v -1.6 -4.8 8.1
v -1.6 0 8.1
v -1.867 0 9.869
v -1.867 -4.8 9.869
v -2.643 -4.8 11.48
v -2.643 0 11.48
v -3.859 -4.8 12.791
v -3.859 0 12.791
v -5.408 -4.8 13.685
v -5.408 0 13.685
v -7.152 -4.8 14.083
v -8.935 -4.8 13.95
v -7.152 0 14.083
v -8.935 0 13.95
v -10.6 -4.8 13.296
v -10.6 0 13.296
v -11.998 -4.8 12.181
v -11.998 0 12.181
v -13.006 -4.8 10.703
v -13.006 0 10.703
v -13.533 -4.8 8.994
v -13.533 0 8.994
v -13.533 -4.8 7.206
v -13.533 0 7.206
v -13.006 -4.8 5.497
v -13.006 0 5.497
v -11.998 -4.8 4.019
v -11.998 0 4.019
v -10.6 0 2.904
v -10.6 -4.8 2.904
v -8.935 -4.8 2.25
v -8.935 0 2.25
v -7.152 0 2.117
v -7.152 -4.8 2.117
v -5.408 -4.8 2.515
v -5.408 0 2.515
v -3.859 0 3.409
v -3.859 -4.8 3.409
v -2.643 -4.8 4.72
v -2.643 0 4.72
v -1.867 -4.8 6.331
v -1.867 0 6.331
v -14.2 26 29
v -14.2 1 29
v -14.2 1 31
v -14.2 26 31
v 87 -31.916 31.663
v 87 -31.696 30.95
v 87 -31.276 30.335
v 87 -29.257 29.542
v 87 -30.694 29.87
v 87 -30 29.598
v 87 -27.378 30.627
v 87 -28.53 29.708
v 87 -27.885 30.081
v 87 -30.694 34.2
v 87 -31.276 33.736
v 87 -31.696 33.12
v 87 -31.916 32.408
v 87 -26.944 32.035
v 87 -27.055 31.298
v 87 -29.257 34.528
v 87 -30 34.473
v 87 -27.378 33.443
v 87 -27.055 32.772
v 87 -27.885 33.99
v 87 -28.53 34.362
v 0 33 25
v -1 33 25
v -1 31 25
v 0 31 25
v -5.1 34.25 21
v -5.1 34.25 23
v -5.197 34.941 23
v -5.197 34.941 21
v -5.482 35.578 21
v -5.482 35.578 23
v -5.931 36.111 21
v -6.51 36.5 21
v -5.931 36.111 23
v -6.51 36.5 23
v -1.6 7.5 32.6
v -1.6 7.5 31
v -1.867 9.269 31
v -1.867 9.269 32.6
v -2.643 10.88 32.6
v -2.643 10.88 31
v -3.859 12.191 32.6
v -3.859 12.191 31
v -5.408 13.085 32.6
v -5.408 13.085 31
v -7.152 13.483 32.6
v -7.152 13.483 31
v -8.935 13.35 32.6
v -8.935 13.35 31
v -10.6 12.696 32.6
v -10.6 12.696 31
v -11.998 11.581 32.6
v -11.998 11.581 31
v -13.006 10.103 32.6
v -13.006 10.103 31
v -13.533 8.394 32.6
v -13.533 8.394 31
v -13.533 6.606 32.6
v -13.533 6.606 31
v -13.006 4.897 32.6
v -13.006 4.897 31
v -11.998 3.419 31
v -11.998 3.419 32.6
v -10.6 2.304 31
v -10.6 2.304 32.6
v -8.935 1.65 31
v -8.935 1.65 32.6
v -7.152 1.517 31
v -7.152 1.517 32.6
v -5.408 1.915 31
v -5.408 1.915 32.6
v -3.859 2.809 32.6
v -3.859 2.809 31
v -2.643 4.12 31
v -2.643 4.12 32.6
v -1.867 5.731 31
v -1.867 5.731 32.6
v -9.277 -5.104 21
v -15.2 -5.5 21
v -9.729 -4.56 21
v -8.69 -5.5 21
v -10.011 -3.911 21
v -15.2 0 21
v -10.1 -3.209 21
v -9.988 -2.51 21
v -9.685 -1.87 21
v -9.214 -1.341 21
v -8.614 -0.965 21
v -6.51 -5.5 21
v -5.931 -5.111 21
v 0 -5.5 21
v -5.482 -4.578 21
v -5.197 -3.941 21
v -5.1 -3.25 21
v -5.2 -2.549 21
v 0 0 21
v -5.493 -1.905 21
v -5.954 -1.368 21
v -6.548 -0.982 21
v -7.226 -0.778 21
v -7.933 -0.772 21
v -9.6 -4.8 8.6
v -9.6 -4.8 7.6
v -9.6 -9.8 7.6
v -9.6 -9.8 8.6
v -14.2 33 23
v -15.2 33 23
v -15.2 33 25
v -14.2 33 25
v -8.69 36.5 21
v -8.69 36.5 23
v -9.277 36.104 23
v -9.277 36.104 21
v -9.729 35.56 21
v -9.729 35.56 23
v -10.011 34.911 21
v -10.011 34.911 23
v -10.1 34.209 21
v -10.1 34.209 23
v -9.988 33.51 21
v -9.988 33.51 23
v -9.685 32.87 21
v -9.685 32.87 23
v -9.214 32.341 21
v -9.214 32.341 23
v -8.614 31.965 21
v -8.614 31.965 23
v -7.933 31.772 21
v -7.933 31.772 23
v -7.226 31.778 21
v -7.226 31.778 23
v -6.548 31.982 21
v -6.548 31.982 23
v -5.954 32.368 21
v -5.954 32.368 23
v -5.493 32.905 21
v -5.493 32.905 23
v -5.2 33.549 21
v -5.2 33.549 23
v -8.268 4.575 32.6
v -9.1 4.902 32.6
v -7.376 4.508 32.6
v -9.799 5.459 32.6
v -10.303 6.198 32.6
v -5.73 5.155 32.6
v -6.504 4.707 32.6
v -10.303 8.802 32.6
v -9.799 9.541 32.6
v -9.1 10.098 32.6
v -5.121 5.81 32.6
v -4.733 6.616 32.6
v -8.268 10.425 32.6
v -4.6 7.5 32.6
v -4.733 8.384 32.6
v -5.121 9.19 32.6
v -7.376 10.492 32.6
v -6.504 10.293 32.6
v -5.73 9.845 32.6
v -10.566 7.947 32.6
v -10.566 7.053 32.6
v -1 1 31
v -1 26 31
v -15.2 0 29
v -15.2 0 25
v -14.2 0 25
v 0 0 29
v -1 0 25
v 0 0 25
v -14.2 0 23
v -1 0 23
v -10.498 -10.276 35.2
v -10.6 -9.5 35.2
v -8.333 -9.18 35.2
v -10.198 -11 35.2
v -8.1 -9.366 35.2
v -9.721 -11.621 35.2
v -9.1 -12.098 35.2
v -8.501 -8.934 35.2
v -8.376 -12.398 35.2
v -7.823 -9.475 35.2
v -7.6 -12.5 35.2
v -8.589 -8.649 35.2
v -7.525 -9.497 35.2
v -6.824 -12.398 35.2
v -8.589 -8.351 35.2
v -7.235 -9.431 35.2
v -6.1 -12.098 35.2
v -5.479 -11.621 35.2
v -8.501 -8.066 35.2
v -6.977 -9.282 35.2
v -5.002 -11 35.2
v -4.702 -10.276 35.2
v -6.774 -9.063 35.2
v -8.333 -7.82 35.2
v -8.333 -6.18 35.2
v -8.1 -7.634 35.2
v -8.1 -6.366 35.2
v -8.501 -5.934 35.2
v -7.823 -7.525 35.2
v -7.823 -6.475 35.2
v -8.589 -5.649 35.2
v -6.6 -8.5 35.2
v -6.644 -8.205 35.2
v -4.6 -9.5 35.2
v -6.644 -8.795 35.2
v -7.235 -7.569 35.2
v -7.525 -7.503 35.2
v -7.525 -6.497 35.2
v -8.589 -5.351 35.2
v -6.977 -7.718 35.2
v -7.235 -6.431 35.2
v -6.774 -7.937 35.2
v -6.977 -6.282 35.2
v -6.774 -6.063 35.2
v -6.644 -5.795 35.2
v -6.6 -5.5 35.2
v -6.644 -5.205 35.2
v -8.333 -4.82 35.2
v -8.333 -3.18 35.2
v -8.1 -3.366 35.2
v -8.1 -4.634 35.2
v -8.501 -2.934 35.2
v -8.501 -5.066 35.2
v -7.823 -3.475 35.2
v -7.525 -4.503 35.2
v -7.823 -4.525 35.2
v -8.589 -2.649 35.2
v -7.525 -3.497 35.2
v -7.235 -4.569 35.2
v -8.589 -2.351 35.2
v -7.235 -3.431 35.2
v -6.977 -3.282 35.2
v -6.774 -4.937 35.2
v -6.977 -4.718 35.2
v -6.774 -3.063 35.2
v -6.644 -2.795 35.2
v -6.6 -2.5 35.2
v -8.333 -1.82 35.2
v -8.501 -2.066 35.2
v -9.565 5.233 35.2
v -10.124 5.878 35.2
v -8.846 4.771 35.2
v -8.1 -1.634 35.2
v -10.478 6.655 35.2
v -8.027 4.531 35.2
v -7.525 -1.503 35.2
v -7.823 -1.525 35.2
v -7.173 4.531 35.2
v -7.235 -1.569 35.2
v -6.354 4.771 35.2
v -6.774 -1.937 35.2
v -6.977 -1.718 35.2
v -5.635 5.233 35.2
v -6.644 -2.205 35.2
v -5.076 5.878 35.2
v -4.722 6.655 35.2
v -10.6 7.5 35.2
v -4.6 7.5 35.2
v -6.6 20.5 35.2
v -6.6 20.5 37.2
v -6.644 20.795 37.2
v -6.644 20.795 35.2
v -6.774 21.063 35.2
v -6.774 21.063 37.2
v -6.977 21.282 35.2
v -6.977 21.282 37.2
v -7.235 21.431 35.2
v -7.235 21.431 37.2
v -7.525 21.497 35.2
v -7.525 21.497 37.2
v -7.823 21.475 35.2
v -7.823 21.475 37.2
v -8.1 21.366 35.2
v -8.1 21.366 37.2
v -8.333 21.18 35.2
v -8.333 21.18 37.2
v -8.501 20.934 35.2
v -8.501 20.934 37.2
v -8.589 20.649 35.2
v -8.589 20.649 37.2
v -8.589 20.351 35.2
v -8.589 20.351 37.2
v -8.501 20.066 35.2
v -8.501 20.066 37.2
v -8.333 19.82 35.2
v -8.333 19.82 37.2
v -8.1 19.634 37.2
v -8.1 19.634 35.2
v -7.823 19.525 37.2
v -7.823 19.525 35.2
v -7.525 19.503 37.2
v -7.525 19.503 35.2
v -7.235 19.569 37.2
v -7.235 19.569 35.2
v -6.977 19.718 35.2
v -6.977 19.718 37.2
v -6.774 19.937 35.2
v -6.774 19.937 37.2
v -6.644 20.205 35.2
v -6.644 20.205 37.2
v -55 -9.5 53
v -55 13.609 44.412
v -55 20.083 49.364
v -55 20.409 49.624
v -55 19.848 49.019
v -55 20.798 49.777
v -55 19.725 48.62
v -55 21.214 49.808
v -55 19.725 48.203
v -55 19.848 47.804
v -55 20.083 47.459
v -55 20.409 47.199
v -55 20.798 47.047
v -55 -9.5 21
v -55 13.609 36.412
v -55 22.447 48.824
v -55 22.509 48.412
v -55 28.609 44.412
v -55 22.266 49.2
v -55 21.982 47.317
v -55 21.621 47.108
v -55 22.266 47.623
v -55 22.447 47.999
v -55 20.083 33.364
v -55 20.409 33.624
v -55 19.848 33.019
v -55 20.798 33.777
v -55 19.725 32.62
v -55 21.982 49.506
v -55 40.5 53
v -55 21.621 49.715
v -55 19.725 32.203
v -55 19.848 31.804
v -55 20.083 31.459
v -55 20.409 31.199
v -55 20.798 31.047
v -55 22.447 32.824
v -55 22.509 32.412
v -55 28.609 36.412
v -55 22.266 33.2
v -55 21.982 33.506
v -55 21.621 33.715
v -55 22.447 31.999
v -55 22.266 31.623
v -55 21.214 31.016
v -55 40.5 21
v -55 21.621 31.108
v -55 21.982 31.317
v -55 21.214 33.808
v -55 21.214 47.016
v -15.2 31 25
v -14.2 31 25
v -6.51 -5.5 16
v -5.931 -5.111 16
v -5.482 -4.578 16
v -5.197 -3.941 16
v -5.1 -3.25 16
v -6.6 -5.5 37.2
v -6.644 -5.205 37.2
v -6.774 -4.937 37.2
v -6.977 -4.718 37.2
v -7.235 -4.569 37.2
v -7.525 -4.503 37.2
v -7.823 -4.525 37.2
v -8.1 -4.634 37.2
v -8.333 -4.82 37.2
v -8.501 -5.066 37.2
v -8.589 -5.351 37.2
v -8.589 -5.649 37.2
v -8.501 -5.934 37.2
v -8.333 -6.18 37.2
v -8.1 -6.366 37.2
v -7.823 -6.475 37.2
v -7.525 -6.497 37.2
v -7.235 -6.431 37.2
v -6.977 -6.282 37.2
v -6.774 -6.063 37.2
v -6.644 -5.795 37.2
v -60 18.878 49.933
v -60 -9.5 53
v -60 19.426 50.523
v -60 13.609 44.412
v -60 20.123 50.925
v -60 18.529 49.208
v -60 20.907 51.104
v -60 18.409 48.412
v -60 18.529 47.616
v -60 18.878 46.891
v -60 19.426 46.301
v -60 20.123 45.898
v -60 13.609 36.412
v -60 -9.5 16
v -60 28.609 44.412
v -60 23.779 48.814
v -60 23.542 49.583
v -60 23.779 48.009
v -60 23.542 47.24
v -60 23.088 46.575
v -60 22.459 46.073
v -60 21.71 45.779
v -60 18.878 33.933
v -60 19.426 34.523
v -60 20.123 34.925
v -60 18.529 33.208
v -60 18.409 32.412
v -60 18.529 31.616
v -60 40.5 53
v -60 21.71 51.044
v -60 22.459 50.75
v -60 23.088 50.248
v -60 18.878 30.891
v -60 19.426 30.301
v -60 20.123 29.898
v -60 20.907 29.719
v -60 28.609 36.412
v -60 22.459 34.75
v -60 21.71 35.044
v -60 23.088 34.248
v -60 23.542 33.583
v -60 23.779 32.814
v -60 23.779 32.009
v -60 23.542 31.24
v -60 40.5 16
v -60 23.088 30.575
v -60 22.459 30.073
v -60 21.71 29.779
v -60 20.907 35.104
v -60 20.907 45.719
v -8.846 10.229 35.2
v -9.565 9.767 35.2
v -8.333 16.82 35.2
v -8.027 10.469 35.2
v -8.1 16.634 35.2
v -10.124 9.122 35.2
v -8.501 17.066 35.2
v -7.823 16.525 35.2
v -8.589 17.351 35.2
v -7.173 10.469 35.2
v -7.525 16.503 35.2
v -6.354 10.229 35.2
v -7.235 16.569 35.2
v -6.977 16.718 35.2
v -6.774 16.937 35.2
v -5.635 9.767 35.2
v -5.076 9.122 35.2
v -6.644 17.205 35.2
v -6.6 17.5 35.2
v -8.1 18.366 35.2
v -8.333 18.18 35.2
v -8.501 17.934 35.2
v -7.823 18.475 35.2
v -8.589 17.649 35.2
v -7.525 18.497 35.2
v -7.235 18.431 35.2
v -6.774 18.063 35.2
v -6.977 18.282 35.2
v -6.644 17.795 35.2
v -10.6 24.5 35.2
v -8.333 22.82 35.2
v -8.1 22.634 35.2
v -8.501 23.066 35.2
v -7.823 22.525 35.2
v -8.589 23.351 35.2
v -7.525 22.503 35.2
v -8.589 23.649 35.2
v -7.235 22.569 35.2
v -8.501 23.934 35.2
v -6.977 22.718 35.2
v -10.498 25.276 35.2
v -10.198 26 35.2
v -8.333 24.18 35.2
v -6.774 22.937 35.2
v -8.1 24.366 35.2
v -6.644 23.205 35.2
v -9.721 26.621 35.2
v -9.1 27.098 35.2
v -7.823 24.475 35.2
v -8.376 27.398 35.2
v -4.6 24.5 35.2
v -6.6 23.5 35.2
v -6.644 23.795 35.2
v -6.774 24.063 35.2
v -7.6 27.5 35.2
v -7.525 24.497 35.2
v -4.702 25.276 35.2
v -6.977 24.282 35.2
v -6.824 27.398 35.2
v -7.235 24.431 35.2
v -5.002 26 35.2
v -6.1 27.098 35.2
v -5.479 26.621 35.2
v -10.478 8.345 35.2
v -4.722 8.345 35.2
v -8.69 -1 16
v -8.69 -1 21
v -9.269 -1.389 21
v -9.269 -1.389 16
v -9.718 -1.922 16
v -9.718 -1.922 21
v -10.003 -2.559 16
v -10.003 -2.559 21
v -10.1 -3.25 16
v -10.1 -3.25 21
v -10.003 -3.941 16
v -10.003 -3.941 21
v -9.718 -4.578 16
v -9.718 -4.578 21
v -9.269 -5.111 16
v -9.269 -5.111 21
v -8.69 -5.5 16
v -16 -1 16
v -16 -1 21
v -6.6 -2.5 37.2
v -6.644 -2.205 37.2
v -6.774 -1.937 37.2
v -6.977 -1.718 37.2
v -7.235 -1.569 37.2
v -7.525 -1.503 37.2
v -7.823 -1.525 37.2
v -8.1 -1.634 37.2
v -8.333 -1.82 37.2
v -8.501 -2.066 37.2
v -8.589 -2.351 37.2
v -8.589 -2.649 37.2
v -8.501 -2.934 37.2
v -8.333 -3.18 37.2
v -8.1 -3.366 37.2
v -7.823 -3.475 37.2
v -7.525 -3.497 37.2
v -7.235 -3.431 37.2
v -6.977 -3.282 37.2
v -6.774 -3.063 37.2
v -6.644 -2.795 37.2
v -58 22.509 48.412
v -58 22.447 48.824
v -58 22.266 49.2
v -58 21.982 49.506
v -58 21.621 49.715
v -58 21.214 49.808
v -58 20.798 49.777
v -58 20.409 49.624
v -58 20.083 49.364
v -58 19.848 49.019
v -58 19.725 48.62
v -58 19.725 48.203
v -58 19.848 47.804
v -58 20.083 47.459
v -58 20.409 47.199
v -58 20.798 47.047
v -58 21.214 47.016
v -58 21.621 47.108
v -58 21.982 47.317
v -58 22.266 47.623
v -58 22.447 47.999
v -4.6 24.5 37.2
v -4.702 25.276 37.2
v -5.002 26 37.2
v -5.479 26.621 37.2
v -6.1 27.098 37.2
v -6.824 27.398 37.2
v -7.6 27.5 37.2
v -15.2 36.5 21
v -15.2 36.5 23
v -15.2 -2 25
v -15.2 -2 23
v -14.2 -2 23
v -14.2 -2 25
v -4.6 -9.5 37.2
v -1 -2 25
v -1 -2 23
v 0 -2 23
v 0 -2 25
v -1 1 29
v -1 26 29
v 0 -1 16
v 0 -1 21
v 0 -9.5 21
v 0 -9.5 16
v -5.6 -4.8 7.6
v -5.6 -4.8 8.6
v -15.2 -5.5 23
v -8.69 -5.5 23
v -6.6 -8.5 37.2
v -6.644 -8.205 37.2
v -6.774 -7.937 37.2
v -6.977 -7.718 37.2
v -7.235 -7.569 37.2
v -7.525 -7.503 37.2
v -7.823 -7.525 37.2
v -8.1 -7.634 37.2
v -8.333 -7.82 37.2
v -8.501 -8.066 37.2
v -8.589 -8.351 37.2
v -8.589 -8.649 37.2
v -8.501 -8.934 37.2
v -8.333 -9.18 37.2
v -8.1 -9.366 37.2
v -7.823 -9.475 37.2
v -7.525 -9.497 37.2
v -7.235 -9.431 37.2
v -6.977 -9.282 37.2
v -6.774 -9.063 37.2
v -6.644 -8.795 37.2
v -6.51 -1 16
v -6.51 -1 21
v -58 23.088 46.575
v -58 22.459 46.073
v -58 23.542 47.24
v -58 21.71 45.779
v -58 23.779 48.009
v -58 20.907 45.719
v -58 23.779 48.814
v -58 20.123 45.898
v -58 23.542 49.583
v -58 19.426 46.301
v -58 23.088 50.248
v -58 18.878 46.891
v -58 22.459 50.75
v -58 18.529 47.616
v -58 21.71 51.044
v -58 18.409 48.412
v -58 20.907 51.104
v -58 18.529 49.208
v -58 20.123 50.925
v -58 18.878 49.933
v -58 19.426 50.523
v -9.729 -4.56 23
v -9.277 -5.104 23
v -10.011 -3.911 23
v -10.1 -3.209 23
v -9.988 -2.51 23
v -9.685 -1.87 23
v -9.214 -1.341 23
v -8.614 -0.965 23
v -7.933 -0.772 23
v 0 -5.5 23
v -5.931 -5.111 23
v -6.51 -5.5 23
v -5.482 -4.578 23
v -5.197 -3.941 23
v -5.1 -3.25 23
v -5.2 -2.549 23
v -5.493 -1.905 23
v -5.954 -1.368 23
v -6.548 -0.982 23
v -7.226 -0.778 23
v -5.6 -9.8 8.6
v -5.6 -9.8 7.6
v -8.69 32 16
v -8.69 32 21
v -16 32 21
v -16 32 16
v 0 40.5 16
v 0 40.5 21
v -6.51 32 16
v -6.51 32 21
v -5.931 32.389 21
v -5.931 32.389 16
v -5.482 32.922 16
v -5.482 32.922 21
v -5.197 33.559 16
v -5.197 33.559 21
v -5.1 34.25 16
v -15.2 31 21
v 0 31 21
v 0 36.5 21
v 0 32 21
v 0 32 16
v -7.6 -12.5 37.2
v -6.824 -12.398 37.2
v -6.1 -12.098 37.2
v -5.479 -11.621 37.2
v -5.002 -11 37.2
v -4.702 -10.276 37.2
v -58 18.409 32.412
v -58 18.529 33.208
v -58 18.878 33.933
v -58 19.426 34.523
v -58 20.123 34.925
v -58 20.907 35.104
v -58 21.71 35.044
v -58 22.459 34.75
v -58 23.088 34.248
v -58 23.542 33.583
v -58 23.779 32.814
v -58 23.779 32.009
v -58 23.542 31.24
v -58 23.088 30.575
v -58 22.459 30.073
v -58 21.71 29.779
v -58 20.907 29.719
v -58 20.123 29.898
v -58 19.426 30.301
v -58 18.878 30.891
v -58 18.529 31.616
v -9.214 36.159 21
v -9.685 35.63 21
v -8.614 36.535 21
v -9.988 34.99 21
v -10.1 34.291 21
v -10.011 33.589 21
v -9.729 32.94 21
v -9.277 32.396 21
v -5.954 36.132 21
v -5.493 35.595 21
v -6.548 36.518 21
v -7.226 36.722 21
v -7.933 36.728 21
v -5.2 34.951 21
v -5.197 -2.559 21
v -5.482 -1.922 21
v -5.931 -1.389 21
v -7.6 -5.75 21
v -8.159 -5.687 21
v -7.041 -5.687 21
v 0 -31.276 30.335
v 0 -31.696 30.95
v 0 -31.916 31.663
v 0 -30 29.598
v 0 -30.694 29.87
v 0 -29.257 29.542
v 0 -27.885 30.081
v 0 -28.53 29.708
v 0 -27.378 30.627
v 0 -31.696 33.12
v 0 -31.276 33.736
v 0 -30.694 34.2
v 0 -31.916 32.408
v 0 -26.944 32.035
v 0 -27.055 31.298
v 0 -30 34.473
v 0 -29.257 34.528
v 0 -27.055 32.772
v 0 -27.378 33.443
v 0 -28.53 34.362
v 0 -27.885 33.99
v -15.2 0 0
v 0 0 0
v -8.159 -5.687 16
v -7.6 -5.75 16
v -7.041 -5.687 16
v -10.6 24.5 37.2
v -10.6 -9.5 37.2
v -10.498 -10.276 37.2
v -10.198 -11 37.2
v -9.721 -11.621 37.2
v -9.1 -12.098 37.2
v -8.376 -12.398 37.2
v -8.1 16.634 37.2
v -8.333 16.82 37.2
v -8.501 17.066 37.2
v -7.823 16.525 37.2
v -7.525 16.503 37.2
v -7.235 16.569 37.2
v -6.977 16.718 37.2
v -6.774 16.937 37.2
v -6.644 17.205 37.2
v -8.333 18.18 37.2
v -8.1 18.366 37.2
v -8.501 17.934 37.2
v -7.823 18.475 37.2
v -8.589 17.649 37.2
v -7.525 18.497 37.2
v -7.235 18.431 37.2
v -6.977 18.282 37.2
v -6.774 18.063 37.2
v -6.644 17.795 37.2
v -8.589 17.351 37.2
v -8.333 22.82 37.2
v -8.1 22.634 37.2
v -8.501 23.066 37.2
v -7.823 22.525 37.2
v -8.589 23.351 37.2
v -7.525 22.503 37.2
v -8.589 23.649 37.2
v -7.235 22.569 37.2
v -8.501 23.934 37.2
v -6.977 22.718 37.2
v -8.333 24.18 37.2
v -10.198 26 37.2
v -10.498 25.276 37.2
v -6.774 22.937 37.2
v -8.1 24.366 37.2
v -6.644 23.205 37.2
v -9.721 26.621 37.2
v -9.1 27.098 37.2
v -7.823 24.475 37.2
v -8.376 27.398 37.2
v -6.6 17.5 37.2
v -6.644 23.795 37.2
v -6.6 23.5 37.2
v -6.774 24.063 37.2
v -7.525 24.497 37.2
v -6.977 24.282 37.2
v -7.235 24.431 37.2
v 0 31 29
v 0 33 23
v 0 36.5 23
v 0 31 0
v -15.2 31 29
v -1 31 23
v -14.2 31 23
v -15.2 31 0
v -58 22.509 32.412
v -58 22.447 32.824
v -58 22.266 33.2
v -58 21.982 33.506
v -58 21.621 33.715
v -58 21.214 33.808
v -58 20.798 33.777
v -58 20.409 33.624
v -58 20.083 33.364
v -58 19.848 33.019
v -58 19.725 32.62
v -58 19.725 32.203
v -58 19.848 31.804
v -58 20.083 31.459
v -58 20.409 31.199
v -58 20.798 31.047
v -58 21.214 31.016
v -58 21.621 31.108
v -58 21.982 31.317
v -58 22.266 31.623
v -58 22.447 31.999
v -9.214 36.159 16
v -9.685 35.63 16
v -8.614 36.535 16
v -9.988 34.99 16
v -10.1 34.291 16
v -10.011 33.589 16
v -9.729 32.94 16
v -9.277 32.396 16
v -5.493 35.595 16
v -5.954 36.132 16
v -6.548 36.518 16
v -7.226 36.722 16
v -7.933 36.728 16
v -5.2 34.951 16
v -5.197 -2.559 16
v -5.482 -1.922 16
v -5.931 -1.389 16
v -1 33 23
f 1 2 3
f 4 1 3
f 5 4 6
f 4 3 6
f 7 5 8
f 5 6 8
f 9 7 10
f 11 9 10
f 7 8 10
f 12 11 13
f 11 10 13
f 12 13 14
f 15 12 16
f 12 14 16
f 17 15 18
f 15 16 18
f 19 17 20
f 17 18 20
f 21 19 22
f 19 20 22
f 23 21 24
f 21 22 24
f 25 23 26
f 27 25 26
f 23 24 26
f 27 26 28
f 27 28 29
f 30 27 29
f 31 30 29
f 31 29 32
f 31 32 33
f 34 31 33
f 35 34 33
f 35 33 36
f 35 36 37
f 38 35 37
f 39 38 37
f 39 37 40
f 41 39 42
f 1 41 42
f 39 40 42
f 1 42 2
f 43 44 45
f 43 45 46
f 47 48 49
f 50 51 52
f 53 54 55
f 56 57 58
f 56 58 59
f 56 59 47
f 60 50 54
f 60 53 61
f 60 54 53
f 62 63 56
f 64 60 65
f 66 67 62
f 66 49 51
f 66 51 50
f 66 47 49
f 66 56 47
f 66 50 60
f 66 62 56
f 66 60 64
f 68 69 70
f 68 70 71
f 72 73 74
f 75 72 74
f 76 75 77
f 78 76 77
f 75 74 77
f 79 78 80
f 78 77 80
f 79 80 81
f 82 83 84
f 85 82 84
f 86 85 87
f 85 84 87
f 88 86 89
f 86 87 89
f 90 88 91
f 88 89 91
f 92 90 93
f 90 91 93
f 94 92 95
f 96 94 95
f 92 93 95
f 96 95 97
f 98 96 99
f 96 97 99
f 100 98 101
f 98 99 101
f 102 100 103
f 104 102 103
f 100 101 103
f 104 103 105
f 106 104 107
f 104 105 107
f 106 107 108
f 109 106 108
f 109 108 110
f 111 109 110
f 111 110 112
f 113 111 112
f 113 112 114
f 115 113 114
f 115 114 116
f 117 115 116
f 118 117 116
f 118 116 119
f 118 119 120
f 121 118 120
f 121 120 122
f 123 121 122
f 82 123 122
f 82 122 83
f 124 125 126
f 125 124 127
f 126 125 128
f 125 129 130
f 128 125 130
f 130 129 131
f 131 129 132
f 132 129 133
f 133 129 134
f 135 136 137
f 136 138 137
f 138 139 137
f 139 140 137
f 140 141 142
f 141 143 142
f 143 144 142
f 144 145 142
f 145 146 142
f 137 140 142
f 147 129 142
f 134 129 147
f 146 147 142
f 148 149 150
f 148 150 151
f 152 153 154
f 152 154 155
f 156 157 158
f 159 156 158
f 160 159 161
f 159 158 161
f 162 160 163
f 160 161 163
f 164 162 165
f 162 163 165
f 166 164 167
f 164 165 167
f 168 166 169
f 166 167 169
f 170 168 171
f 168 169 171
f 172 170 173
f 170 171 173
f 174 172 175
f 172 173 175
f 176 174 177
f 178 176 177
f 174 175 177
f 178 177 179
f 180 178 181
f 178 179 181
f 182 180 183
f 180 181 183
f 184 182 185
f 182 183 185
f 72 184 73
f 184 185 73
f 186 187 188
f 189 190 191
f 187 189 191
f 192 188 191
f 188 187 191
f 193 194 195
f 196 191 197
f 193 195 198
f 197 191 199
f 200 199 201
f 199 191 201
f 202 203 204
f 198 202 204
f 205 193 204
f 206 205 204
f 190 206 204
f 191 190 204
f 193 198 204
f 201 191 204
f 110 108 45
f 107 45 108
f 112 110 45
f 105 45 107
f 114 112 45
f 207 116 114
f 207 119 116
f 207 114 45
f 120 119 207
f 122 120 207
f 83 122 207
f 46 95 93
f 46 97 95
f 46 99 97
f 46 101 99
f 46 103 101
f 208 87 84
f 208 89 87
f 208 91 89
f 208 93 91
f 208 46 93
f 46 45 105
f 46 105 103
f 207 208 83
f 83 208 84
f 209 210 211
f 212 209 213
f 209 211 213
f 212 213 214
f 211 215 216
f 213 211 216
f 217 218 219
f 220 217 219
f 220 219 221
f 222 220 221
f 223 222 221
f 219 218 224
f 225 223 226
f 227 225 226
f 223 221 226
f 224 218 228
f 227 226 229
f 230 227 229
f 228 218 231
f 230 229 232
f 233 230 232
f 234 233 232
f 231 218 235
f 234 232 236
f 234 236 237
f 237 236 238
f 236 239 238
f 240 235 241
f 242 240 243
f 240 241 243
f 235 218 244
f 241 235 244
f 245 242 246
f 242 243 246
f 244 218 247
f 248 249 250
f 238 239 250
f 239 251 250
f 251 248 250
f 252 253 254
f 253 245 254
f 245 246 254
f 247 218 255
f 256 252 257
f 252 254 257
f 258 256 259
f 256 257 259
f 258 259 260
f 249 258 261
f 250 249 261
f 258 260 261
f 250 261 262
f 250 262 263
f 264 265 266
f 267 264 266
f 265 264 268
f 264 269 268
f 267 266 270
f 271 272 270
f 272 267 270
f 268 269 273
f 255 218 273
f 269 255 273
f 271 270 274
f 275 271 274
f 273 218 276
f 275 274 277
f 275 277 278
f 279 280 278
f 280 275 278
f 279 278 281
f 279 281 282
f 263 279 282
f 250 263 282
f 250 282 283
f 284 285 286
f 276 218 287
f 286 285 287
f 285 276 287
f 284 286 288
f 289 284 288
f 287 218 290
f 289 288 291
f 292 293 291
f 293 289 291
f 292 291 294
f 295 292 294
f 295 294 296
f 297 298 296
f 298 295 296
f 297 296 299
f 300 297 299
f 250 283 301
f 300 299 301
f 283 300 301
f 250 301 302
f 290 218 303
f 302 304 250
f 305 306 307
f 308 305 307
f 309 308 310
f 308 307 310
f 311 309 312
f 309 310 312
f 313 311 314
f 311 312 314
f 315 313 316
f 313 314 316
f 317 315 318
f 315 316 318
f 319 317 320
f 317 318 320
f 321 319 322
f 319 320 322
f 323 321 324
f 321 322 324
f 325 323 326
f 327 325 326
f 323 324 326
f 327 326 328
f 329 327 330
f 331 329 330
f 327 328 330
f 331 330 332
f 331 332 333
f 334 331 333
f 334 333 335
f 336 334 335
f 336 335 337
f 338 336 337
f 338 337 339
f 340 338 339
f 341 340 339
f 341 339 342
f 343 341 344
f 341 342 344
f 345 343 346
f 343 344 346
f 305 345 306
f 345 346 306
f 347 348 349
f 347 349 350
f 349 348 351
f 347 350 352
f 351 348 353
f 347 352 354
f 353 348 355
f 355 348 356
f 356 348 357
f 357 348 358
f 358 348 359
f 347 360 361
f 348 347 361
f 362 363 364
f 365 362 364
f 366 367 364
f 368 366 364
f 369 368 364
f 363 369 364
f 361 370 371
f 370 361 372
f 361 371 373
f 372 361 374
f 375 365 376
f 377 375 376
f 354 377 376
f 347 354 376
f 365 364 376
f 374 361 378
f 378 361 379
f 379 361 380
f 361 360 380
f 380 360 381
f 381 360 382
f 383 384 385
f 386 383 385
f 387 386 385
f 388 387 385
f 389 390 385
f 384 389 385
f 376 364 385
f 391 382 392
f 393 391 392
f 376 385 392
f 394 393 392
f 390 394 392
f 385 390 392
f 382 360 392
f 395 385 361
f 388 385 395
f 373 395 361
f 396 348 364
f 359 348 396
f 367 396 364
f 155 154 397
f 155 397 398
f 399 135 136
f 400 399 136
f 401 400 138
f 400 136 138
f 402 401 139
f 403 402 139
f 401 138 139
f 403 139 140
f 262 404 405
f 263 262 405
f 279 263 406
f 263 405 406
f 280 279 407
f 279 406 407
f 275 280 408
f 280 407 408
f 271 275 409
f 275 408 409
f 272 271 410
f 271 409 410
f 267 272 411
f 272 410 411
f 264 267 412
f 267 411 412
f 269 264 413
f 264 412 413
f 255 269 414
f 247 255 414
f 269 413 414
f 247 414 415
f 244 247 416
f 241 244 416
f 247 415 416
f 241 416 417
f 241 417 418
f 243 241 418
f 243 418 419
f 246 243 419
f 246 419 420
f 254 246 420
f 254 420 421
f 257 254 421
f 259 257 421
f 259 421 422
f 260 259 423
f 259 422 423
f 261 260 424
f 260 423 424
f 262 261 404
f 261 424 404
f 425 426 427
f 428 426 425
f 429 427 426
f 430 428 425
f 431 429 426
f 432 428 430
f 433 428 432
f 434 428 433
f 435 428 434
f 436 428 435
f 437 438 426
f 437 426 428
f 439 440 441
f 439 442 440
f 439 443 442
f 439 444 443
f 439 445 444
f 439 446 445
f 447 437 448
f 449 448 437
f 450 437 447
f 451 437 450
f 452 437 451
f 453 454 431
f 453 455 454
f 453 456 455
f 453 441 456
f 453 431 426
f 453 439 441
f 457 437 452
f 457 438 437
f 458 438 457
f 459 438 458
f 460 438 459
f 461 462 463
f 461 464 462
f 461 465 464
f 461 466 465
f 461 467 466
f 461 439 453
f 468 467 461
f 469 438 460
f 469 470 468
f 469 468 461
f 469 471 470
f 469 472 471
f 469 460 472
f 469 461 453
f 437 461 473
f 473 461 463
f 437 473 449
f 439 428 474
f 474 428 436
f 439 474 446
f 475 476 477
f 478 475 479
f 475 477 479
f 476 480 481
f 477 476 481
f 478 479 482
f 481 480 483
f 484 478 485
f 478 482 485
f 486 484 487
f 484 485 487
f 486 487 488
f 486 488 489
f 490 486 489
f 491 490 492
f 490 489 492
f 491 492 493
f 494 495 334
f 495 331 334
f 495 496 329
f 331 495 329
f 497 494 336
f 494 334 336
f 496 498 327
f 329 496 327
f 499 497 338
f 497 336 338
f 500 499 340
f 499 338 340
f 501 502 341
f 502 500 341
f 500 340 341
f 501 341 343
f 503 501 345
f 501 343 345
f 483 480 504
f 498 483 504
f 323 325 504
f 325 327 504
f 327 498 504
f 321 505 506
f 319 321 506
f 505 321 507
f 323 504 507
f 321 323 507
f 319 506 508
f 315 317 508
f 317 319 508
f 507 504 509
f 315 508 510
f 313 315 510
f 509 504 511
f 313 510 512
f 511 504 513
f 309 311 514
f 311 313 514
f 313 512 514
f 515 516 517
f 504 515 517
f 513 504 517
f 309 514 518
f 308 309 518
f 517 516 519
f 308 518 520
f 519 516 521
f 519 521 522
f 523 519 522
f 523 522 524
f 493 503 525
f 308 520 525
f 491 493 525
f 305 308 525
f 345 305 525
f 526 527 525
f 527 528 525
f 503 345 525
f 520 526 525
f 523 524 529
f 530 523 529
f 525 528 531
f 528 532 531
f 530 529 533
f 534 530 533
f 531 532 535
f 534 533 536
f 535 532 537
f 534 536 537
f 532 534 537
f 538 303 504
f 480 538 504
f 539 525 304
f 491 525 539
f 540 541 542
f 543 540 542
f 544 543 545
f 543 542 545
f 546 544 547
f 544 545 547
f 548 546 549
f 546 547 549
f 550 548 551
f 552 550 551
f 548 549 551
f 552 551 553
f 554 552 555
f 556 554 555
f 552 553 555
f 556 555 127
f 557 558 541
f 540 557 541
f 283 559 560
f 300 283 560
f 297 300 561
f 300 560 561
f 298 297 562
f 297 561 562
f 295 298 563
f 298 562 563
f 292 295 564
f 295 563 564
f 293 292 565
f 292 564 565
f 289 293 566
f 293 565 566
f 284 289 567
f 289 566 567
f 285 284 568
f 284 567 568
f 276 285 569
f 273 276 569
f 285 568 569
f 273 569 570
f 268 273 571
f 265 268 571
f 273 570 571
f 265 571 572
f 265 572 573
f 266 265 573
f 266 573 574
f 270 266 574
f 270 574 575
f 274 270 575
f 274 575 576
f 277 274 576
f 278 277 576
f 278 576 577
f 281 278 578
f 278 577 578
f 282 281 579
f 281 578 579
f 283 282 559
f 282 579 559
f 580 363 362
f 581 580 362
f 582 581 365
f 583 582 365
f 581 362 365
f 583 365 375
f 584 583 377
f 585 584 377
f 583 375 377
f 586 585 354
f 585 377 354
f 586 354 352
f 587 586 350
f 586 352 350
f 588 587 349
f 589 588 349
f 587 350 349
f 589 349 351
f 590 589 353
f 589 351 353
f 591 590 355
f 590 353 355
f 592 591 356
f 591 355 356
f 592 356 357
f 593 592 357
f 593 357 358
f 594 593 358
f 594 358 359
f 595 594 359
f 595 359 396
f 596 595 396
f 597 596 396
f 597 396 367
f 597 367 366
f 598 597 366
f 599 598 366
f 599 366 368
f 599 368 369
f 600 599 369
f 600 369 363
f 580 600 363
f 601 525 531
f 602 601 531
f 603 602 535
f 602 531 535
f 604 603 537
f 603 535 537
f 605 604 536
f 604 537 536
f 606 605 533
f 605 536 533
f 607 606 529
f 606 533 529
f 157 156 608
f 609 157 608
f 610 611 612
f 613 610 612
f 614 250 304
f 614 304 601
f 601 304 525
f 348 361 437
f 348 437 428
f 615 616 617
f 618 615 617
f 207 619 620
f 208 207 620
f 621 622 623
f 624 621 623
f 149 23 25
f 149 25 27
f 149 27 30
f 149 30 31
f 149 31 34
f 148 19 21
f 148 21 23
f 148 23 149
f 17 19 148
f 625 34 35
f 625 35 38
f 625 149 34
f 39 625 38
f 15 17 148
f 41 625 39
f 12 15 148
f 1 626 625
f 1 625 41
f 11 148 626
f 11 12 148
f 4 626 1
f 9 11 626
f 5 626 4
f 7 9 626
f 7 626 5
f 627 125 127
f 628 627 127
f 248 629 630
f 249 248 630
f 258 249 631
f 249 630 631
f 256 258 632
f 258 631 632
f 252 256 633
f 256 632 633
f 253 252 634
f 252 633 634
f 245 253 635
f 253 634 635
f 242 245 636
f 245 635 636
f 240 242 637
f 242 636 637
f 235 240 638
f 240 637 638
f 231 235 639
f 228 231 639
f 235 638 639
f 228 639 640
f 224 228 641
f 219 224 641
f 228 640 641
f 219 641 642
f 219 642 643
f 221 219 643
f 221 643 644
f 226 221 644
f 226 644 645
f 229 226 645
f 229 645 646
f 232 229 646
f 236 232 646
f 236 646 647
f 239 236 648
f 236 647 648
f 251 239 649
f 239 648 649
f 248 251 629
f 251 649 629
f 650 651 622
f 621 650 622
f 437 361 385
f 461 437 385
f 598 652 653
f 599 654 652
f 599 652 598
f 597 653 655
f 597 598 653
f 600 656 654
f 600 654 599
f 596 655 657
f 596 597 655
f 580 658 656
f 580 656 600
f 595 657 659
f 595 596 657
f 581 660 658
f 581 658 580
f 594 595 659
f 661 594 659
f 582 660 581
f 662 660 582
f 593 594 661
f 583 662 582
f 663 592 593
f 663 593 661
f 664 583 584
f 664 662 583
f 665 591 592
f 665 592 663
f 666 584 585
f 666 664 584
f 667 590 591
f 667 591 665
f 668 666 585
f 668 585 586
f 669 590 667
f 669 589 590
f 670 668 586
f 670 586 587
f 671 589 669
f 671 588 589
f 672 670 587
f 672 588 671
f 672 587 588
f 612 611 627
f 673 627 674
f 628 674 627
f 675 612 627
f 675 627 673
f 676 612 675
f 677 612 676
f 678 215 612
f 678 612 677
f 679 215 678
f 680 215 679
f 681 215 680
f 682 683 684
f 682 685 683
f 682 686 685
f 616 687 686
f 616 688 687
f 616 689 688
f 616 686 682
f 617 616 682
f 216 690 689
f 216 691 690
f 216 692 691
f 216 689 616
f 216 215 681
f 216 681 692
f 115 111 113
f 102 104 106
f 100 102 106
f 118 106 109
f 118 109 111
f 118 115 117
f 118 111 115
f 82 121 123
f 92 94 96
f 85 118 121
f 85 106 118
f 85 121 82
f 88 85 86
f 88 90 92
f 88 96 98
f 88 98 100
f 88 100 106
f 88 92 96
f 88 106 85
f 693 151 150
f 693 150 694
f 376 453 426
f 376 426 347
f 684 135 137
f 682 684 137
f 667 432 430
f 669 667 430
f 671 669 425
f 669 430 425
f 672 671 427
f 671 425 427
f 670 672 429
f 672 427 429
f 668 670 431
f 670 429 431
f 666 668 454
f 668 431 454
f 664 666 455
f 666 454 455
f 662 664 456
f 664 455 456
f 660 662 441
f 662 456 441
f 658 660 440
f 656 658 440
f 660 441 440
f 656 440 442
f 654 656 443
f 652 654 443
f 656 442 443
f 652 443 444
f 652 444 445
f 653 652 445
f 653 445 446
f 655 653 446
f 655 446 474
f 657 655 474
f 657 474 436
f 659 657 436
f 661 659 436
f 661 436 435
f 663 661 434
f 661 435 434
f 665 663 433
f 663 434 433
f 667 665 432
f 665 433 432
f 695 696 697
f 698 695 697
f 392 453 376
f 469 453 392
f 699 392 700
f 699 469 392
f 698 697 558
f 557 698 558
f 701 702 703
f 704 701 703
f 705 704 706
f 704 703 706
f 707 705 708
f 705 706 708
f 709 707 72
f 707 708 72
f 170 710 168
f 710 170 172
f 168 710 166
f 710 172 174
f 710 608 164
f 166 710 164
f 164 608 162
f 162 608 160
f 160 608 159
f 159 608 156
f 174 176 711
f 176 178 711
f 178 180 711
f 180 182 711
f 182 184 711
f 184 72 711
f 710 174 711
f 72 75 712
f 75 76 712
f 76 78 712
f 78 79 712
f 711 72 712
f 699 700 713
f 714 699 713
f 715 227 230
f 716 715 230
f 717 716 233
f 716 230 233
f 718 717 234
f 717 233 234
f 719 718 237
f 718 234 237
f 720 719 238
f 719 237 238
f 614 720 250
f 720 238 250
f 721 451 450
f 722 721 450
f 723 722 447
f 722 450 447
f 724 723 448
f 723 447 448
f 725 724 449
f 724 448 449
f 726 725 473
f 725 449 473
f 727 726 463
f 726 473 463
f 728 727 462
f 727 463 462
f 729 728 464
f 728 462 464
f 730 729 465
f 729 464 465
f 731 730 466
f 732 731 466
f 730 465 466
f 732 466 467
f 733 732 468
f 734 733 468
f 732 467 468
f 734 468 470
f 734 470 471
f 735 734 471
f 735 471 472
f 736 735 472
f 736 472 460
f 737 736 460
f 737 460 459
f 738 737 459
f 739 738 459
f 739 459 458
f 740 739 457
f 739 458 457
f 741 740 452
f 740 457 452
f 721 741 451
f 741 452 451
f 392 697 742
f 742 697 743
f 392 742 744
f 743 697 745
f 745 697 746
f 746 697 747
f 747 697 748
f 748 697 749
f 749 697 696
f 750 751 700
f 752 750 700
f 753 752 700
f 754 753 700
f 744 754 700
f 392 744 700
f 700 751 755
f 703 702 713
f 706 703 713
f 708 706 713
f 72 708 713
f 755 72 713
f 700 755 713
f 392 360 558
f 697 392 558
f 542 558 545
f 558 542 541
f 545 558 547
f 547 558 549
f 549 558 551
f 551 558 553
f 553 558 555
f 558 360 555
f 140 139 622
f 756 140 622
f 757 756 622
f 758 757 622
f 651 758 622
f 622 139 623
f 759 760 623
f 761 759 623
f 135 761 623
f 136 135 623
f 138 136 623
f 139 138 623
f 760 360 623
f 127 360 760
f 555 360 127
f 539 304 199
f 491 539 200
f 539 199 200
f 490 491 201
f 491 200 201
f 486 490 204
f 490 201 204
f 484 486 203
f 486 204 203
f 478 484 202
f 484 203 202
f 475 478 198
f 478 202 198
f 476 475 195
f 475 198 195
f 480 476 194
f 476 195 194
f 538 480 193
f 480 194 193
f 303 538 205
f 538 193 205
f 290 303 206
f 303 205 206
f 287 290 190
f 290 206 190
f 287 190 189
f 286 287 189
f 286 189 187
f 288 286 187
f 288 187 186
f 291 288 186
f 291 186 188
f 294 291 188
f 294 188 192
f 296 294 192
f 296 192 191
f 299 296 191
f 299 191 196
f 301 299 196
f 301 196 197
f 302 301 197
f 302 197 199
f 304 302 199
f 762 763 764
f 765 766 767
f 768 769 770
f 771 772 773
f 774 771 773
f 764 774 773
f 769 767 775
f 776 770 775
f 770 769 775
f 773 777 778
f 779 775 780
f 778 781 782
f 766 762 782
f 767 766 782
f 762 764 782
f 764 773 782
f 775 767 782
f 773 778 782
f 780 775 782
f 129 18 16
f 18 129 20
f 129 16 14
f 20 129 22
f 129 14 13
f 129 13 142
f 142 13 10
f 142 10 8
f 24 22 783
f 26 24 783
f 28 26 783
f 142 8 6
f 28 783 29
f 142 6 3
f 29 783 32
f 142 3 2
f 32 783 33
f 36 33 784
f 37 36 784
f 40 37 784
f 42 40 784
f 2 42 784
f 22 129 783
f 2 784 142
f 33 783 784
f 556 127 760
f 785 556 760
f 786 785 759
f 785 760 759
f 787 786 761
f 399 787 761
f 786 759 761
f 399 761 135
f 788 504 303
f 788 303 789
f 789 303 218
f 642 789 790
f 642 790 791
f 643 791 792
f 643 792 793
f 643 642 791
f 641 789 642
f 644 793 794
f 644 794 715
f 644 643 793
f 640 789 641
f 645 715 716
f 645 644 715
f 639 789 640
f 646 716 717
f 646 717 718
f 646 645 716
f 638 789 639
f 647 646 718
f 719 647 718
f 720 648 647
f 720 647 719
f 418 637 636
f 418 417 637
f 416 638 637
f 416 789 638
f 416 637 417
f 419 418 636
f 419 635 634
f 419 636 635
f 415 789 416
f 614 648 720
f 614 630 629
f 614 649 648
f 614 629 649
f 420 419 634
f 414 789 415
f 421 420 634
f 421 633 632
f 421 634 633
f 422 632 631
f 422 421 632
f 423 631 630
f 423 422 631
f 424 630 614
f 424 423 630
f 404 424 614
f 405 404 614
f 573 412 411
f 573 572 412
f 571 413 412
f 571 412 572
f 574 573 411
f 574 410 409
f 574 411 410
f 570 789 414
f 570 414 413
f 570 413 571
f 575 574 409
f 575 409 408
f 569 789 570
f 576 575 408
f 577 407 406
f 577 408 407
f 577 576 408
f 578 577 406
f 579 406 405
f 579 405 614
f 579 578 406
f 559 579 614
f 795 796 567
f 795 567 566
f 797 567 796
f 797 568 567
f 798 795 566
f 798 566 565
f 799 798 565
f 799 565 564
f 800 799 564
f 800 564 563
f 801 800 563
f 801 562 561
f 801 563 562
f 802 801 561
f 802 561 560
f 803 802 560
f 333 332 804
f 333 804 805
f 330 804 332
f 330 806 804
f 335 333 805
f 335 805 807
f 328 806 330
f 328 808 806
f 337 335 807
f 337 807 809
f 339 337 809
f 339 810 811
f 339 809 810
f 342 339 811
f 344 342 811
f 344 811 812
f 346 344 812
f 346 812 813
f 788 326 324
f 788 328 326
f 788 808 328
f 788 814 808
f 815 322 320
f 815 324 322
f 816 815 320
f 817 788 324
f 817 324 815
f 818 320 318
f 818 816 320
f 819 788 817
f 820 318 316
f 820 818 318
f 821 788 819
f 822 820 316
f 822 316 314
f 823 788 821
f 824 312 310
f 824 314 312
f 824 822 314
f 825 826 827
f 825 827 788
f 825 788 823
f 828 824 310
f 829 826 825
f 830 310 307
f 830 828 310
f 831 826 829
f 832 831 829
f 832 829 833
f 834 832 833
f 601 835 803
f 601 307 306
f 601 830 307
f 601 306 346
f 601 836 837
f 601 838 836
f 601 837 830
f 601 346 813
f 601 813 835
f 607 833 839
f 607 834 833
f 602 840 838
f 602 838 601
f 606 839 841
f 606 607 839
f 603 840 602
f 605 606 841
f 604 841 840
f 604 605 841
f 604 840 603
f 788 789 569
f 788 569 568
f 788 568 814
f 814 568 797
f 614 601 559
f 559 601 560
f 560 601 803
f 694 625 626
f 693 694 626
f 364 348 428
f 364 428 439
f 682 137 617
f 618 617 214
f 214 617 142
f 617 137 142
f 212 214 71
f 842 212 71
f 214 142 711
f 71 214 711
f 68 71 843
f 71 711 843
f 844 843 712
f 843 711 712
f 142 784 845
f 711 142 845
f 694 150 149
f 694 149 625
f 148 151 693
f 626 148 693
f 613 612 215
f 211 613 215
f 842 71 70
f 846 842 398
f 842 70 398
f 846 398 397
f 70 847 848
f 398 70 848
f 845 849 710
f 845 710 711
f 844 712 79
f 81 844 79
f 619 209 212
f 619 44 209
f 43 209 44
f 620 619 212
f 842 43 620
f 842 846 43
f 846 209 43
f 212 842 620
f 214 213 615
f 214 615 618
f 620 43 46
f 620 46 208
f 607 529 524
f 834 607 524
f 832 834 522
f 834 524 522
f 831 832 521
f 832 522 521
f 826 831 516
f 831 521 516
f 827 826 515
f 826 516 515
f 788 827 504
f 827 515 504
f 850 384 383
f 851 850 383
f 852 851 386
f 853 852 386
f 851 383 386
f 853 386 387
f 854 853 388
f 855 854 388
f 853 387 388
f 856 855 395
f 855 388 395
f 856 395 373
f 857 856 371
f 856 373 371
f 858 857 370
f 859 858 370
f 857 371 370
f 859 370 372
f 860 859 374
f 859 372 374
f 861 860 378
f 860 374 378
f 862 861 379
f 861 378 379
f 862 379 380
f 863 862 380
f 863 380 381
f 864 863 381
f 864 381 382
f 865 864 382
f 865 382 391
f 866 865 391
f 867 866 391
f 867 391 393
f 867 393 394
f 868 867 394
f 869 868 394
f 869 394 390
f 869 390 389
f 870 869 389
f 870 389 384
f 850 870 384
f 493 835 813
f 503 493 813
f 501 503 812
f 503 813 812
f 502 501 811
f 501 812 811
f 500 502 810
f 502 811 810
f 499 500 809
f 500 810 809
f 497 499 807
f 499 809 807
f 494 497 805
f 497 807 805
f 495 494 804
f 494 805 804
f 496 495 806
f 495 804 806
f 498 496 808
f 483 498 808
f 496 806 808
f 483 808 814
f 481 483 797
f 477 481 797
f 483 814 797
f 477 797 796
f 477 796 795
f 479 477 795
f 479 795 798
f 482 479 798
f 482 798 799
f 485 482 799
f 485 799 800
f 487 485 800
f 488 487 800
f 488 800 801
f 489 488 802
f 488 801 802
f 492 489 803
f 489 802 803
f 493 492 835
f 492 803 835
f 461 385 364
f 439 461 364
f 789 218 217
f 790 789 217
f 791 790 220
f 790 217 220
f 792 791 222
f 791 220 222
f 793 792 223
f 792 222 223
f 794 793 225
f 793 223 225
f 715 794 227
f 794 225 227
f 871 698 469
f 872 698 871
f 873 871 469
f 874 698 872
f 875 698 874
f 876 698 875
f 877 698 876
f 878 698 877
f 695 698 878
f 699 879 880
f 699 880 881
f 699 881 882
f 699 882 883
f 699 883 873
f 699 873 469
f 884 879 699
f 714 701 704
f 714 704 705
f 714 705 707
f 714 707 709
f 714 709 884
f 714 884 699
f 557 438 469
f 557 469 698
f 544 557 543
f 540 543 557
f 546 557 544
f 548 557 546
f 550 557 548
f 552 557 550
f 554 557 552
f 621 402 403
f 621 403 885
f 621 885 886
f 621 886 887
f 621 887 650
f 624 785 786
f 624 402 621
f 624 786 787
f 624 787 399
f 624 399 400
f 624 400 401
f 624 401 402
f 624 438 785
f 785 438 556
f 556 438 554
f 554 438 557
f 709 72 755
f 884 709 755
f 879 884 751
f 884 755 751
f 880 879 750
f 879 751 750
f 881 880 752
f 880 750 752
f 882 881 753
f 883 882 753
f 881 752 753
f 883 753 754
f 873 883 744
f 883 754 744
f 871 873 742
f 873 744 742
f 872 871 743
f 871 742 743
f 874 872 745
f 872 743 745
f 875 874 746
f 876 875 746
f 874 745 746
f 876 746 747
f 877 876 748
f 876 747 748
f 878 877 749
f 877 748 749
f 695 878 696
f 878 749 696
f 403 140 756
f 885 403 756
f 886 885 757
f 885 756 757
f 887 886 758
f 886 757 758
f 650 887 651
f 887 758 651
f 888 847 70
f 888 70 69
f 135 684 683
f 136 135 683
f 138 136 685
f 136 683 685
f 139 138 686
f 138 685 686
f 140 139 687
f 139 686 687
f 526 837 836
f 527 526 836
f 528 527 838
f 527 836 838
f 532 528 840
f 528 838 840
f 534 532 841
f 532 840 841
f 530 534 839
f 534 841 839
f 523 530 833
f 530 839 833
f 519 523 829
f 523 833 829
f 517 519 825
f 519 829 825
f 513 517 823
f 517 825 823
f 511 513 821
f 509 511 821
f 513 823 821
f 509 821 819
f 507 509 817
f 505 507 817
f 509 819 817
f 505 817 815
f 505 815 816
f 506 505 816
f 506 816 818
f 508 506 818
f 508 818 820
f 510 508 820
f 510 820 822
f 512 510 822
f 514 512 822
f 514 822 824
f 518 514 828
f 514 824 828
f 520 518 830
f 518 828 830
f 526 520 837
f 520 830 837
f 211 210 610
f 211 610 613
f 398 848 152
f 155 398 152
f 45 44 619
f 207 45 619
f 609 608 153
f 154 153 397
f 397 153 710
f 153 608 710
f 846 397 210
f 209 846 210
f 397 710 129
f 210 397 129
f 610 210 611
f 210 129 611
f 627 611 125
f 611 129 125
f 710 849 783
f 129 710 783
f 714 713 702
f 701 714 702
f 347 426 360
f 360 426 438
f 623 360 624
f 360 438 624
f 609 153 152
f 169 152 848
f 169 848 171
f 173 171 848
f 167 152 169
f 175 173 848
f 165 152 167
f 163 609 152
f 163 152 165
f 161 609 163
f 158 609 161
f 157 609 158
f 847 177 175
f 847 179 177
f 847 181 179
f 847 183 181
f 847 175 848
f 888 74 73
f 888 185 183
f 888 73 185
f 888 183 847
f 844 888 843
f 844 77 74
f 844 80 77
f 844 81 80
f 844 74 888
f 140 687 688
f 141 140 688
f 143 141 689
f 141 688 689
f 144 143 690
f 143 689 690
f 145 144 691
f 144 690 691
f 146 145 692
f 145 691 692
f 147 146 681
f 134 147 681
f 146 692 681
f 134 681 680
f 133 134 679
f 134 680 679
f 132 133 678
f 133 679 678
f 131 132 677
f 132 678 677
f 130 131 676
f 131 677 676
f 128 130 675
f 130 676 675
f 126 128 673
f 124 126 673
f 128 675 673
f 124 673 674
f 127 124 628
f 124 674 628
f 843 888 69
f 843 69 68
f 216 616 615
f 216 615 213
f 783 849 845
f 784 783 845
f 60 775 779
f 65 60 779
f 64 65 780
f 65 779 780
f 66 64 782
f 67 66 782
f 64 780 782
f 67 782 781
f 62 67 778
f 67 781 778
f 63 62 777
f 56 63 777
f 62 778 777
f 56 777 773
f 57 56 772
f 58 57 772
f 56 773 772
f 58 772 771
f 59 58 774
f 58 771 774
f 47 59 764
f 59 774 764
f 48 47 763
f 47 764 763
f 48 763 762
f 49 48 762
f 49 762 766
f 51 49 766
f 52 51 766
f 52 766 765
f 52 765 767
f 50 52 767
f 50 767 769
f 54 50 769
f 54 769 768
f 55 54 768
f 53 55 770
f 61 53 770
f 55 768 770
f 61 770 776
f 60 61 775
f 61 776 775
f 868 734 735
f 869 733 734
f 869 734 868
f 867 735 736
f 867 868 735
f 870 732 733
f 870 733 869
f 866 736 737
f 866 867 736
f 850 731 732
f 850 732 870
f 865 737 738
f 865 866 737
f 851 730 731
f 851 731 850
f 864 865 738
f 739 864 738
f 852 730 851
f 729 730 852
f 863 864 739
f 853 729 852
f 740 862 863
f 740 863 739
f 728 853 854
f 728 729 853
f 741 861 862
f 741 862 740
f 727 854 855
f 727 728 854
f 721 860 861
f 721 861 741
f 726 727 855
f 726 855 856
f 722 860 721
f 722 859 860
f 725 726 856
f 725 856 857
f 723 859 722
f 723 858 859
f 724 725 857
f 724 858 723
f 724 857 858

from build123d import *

# Parameters (mm, degrees)
F0_W      = 15.2
F0_H      = 31
F1_DEPTH  = 21
F3_DEPTH  = 2
F5_DEPTH  = 14.4
F4_W      = 1
F4_H      = 2
F6_DEPTH  = 2
F7_DEPTH  = 6
F8_R      = 6
F9_DEPTH  = 3.6
F8_W      = 13.2
F8_H      = 25
F10_DEPTH = 2
F11_R     = 3
F12_DEPTH = 2.6
F13_R     = 6
F14_DEPTH = 4.8
F15_W     = 4
F15_H     = 1
F16_DEPTH = 5
F18_DEPTH = 2
F19_R     = 1
F20_DEPTH = 2
F22_DEPTH = 5
F23_W     = 5
F23_H     = 50
F24_DEPTH = 32
F25_R     = 1.4
F25_W     = 15
F25_H     = 8
F26_DEPTH = 5
F27_R     = 2.7
F28_DEPTH = 2
F29_R     = 2.5
F30_DEPTH = 87


# Not quite as in the source:
# - an extrude ends at something that could not be found from the text; its depth is read off the source's solid


with BuildPart() as f1:
    # F0 (on Top) → F1 (new body)
    with BuildSketch(Plane.XY):
        with Locations((-7.6, 15.5)):
            Rectangle(F0_W, F0_H)
    extrude(amount=F1_DEPTH)

    # F2 (on face) → F3 (join)
    with BuildSketch(Plane.XY.offset(21)):
        Polygon((0, 36.5), (-15.2, 36.5), (-15.2, 31), (-15.2, 0), (-15.2, -5.5), (0, -5.5), (0, 0), (0, 31), align=None)
    extrude(amount=F3_DEPTH)

    # F4 (on face) → F5 (cut, through all)
    with BuildSketch(Plane.XY.offset(23)):
        with BuildLine():
            ThreePointArc((-6.5102752641, 36.5), (-7.6, 36.75), (-8.6897247359, 36.5))
            Line((-8.6897247359, 36.5), (-6.5102752641, 36.5))
        make_face()
        with BuildLine():
            Line((-6.5102752641, 36.5), (-8.6897247359, 36.5))
            ThreePointArc((-8.6897247359, 36.5), (-8.9277213865, 32.1317091985), (-5.1, 34.25))
            ThreePointArc((-5.1, 34.25), (-5.4817091985, 35.5777213865), (-6.5102752641, 36.5))
        make_face()
        with BuildLine():
            Line((-6.5102752641, -5.5), (-8.6897247359, -5.5))
            ThreePointArc((-8.6897247359, -5.5), (-7.6, -5.75), (-6.5102752641, -5.5))
        make_face()
        with BuildLine():
            ThreePointArc((-5.1, -3.25), (-8.9277213865, -1.1317091985), (-8.6897247359, -5.5))
            Line((-8.6897247359, -5.5), (-6.5102752641, -5.5))
            ThreePointArc((-6.5102752641, -5.5), (-5.4817091985, -4.5777213865), (-5.1, -3.25))
        make_face()
    extrude(amount=-F5_DEPTH, mode=Mode.SUBTRACT)

    # F4 (on face) → F6 (join)
    with BuildSketch(Plane.XY.offset(23)):
        with Locations((-14.7, 32)):
            Rectangle(F4_W, F4_H)
        with Locations((-0.5, 32)):
            Rectangle(F4_W, F4_H)
        with Locations((-0.5, -1)):
            Rectangle(F4_W, F4_H)
        with Locations((-14.7, -1)):
            Rectangle(F4_W, F4_H)
    extrude(amount=F6_DEPTH)

    # F4 (on face) → F7 (join)
    with BuildSketch(Plane.XY.offset(23)):
        Polygon((-14.2, 31), (-15.2, 31), (-15.2, 0), (-14.2, 0), (-1, 0), (0, 0), (0, 31), (-1, 31), align=None)
    extrude(amount=F7_DEPTH)

    # F8 (on face) → F9 (join)
    with BuildSketch(Plane.XY.offset(29)):
        with Locations((-7.6, 7.5)):
            Circle(F8_R)
    extrude(amount=F9_DEPTH)

    # F8 (on face) → F10 (join)
    with BuildSketch(Plane.XY.offset(29)):
        with Locations((-7.6, 13.5)):
            Rectangle(F8_W, F8_H)
        with Locations((-7.6, 7.5)):
            Circle(F8_R, mode=Mode.SUBTRACT)
    extrude(amount=F10_DEPTH)

    # F13 (on face) → F14 (join)
    with BuildSketch(Plane.XZ):
        with Locations((-7.6, 8.1)):
            Circle(F13_R)
    extrude(amount=F14_DEPTH)

    # F15 (on face) → F16 (join)
    with BuildSketch(Plane.XZ.offset(4.8)):
        with Locations((-7.6, 8.1)):
            Rectangle(F15_W, F15_H)
    extrude(amount=F16_DEPTH)


with BuildPart() as f12:
    # F11 (on face) → F12 (new body)
    with BuildSketch(Plane.XY.offset(32.6)):
        with Locations((-7.6, 7.5)):
            Circle(F11_R)
    extrude(amount=F12_DEPTH)

    # F17 (on face) → F18 (join)
    with BuildSketch(Plane.XY.offset(35.2)):
        with BuildLine():
            ThreePointArc((-7.6, 27.5), (-9.7213203436, 26.6213203436), (-10.6, 24.5))
            Line((-10.6, 24.5), (-10.6, -9.5))
            ThreePointArc((-10.6, -9.5), (-9.7213203436, -11.6213203436), (-7.6, -12.5))
            ThreePointArc((-7.6, -12.5), (-5.4786796564, -11.6213203436), (-4.6, -9.5))
            Line((-4.6, -9.5), (-4.6, 24.5))
            ThreePointArc((-4.6, 24.5), (-5.4786796564, 26.6213203436), (-7.6, 27.5))
        make_face()
    extrude(amount=F18_DEPTH)

    # F19 (on face) → F20 (cut, through all)
    with BuildSketch(Plane.XY.offset(37.2)):
        with Locations((-7.6, 23.5)):
            Circle(F19_R)
        with Locations((-7.6, -8.5)):
            Circle(F19_R)
        with Locations((-7.6, 20.5)):
            Circle(F19_R)
        with Locations((-7.6, 17.5)):
            Circle(F19_R)
        with Locations((-7.6, -2.5)):
            Circle(F19_R)
        with Locations((-7.6, -5.5)):
            Circle(F19_R)
    extrude(amount=-F20_DEPTH, mode=Mode.SUBTRACT)


with BuildPart() as f22:
    # F21 (on face) → F22 (new body)
    with BuildSketch(Plane(origin=(0, 0, 21), x_dir=(1, 0, 0), z_dir=(0, 0, -1))):
        with BuildLine():
            Line((0, 5.5), (0, 9.5))
            Line((0, 9.5), (-60, 9.5))
            Line((-60, 9.5), (-60, -40.5))
            Line((-60, -40.5), (0, -40.5))
            Line((0, -40.5), (0, -32))
            Line((0, -32), (-6.5102752641, -32))
            ThreePointArc((-6.5102752641, -32), (-5.4817091985, -32.9222786135), (-5.1, -34.25))
            ThreePointArc((-5.1, -34.25), (-8.9277213865, -36.3682908015), (-8.6897247359, -32))
            Line((-8.6897247359, -32), (-16, -32))
            Line((-16, -32), (-16, 1))
            Line((-16, 1), (-15.2, 1))
            Line((-15.2, 1), (-15.2, 5.5))
            Line((-15.2, 5.5), (-8.6897247359, 5.5))
            ThreePointArc((-8.6897247359, 5.5), (-7.6, 5.75), (-6.5102752641, 5.5))
            Line((-6.5102752641, 5.5), (0, 5.5))
        make_face()
        with BuildLine():
            Line((0, 1), (0, 5.5))
            Line((0, 5.5), (-6.5102752641, 5.5))
            ThreePointArc((-6.5102752641, 5.5), (-5.4817091985, 4.5777213865), (-5.1, 3.25))
            ThreePointArc((-5.1, 3.25), (-5.4817091985, 1.9222786135), (-6.5102752641, 1))
            Line((-6.5102752641, 1), (0, 1))
        make_face()
        with BuildLine():
            ThreePointArc((-8.6897247359, 1), (-10.1, 3.25), (-8.6897247359, 5.5))
            Line((-8.6897247359, 5.5), (-15.2, 5.5))
            Line((-15.2, 5.5), (-15.2, 1))
            Line((-15.2, 1), (-8.6897247359, 1))
        make_face()
    extrude(amount=F22_DEPTH)

    # F23 (on face) → F24 (join)
    with BuildSketch(Plane.XY.offset(21)):
        with Locations((-57.5, 15.5)):
            Rectangle(F23_W, F23_H)
    extrude(amount=F24_DEPTH)

    # F25 (on face) → F26 (cut, through all)
    with BuildSketch(Plane.YZ.offset(-55)):
        with Locations((21.1092480145, 48.4116717948)):
            Circle(F25_R)
        with Locations((21.1092480145, 32.4116717948)):
            Circle(F25_R)
        with Locations((21.1092480145, 40.4116717948)):
            Rectangle(F25_W, F25_H)
    extrude(amount=-F26_DEPTH, mode=Mode.SUBTRACT)

    # F27 (on face) → F28 (cut)
    with BuildSketch(Plane(origin=(-60, 0, 0), x_dir=(0, -1, 0), z_dir=(-1, 0, 0))):
        with Locations((-21.1092480145, 32.4116717948)):
            Circle(F27_R)
        with Locations((-21.1092480145, 48.4116717948)):
            Circle(F27_R)
    extrude(amount=-F28_DEPTH, mode=Mode.SUBTRACT)


with BuildPart() as f30:
    # F29 (on Right) → F30 (new body)
    with BuildSketch(Plane.YZ):
        with Locations((-29.4437985867, 32.0351906121)):
            Circle(F29_R)
    extrude(amount=F30_DEPTH)


solid = Compound([f1.part, f12.part, f22.part, f30.part])
